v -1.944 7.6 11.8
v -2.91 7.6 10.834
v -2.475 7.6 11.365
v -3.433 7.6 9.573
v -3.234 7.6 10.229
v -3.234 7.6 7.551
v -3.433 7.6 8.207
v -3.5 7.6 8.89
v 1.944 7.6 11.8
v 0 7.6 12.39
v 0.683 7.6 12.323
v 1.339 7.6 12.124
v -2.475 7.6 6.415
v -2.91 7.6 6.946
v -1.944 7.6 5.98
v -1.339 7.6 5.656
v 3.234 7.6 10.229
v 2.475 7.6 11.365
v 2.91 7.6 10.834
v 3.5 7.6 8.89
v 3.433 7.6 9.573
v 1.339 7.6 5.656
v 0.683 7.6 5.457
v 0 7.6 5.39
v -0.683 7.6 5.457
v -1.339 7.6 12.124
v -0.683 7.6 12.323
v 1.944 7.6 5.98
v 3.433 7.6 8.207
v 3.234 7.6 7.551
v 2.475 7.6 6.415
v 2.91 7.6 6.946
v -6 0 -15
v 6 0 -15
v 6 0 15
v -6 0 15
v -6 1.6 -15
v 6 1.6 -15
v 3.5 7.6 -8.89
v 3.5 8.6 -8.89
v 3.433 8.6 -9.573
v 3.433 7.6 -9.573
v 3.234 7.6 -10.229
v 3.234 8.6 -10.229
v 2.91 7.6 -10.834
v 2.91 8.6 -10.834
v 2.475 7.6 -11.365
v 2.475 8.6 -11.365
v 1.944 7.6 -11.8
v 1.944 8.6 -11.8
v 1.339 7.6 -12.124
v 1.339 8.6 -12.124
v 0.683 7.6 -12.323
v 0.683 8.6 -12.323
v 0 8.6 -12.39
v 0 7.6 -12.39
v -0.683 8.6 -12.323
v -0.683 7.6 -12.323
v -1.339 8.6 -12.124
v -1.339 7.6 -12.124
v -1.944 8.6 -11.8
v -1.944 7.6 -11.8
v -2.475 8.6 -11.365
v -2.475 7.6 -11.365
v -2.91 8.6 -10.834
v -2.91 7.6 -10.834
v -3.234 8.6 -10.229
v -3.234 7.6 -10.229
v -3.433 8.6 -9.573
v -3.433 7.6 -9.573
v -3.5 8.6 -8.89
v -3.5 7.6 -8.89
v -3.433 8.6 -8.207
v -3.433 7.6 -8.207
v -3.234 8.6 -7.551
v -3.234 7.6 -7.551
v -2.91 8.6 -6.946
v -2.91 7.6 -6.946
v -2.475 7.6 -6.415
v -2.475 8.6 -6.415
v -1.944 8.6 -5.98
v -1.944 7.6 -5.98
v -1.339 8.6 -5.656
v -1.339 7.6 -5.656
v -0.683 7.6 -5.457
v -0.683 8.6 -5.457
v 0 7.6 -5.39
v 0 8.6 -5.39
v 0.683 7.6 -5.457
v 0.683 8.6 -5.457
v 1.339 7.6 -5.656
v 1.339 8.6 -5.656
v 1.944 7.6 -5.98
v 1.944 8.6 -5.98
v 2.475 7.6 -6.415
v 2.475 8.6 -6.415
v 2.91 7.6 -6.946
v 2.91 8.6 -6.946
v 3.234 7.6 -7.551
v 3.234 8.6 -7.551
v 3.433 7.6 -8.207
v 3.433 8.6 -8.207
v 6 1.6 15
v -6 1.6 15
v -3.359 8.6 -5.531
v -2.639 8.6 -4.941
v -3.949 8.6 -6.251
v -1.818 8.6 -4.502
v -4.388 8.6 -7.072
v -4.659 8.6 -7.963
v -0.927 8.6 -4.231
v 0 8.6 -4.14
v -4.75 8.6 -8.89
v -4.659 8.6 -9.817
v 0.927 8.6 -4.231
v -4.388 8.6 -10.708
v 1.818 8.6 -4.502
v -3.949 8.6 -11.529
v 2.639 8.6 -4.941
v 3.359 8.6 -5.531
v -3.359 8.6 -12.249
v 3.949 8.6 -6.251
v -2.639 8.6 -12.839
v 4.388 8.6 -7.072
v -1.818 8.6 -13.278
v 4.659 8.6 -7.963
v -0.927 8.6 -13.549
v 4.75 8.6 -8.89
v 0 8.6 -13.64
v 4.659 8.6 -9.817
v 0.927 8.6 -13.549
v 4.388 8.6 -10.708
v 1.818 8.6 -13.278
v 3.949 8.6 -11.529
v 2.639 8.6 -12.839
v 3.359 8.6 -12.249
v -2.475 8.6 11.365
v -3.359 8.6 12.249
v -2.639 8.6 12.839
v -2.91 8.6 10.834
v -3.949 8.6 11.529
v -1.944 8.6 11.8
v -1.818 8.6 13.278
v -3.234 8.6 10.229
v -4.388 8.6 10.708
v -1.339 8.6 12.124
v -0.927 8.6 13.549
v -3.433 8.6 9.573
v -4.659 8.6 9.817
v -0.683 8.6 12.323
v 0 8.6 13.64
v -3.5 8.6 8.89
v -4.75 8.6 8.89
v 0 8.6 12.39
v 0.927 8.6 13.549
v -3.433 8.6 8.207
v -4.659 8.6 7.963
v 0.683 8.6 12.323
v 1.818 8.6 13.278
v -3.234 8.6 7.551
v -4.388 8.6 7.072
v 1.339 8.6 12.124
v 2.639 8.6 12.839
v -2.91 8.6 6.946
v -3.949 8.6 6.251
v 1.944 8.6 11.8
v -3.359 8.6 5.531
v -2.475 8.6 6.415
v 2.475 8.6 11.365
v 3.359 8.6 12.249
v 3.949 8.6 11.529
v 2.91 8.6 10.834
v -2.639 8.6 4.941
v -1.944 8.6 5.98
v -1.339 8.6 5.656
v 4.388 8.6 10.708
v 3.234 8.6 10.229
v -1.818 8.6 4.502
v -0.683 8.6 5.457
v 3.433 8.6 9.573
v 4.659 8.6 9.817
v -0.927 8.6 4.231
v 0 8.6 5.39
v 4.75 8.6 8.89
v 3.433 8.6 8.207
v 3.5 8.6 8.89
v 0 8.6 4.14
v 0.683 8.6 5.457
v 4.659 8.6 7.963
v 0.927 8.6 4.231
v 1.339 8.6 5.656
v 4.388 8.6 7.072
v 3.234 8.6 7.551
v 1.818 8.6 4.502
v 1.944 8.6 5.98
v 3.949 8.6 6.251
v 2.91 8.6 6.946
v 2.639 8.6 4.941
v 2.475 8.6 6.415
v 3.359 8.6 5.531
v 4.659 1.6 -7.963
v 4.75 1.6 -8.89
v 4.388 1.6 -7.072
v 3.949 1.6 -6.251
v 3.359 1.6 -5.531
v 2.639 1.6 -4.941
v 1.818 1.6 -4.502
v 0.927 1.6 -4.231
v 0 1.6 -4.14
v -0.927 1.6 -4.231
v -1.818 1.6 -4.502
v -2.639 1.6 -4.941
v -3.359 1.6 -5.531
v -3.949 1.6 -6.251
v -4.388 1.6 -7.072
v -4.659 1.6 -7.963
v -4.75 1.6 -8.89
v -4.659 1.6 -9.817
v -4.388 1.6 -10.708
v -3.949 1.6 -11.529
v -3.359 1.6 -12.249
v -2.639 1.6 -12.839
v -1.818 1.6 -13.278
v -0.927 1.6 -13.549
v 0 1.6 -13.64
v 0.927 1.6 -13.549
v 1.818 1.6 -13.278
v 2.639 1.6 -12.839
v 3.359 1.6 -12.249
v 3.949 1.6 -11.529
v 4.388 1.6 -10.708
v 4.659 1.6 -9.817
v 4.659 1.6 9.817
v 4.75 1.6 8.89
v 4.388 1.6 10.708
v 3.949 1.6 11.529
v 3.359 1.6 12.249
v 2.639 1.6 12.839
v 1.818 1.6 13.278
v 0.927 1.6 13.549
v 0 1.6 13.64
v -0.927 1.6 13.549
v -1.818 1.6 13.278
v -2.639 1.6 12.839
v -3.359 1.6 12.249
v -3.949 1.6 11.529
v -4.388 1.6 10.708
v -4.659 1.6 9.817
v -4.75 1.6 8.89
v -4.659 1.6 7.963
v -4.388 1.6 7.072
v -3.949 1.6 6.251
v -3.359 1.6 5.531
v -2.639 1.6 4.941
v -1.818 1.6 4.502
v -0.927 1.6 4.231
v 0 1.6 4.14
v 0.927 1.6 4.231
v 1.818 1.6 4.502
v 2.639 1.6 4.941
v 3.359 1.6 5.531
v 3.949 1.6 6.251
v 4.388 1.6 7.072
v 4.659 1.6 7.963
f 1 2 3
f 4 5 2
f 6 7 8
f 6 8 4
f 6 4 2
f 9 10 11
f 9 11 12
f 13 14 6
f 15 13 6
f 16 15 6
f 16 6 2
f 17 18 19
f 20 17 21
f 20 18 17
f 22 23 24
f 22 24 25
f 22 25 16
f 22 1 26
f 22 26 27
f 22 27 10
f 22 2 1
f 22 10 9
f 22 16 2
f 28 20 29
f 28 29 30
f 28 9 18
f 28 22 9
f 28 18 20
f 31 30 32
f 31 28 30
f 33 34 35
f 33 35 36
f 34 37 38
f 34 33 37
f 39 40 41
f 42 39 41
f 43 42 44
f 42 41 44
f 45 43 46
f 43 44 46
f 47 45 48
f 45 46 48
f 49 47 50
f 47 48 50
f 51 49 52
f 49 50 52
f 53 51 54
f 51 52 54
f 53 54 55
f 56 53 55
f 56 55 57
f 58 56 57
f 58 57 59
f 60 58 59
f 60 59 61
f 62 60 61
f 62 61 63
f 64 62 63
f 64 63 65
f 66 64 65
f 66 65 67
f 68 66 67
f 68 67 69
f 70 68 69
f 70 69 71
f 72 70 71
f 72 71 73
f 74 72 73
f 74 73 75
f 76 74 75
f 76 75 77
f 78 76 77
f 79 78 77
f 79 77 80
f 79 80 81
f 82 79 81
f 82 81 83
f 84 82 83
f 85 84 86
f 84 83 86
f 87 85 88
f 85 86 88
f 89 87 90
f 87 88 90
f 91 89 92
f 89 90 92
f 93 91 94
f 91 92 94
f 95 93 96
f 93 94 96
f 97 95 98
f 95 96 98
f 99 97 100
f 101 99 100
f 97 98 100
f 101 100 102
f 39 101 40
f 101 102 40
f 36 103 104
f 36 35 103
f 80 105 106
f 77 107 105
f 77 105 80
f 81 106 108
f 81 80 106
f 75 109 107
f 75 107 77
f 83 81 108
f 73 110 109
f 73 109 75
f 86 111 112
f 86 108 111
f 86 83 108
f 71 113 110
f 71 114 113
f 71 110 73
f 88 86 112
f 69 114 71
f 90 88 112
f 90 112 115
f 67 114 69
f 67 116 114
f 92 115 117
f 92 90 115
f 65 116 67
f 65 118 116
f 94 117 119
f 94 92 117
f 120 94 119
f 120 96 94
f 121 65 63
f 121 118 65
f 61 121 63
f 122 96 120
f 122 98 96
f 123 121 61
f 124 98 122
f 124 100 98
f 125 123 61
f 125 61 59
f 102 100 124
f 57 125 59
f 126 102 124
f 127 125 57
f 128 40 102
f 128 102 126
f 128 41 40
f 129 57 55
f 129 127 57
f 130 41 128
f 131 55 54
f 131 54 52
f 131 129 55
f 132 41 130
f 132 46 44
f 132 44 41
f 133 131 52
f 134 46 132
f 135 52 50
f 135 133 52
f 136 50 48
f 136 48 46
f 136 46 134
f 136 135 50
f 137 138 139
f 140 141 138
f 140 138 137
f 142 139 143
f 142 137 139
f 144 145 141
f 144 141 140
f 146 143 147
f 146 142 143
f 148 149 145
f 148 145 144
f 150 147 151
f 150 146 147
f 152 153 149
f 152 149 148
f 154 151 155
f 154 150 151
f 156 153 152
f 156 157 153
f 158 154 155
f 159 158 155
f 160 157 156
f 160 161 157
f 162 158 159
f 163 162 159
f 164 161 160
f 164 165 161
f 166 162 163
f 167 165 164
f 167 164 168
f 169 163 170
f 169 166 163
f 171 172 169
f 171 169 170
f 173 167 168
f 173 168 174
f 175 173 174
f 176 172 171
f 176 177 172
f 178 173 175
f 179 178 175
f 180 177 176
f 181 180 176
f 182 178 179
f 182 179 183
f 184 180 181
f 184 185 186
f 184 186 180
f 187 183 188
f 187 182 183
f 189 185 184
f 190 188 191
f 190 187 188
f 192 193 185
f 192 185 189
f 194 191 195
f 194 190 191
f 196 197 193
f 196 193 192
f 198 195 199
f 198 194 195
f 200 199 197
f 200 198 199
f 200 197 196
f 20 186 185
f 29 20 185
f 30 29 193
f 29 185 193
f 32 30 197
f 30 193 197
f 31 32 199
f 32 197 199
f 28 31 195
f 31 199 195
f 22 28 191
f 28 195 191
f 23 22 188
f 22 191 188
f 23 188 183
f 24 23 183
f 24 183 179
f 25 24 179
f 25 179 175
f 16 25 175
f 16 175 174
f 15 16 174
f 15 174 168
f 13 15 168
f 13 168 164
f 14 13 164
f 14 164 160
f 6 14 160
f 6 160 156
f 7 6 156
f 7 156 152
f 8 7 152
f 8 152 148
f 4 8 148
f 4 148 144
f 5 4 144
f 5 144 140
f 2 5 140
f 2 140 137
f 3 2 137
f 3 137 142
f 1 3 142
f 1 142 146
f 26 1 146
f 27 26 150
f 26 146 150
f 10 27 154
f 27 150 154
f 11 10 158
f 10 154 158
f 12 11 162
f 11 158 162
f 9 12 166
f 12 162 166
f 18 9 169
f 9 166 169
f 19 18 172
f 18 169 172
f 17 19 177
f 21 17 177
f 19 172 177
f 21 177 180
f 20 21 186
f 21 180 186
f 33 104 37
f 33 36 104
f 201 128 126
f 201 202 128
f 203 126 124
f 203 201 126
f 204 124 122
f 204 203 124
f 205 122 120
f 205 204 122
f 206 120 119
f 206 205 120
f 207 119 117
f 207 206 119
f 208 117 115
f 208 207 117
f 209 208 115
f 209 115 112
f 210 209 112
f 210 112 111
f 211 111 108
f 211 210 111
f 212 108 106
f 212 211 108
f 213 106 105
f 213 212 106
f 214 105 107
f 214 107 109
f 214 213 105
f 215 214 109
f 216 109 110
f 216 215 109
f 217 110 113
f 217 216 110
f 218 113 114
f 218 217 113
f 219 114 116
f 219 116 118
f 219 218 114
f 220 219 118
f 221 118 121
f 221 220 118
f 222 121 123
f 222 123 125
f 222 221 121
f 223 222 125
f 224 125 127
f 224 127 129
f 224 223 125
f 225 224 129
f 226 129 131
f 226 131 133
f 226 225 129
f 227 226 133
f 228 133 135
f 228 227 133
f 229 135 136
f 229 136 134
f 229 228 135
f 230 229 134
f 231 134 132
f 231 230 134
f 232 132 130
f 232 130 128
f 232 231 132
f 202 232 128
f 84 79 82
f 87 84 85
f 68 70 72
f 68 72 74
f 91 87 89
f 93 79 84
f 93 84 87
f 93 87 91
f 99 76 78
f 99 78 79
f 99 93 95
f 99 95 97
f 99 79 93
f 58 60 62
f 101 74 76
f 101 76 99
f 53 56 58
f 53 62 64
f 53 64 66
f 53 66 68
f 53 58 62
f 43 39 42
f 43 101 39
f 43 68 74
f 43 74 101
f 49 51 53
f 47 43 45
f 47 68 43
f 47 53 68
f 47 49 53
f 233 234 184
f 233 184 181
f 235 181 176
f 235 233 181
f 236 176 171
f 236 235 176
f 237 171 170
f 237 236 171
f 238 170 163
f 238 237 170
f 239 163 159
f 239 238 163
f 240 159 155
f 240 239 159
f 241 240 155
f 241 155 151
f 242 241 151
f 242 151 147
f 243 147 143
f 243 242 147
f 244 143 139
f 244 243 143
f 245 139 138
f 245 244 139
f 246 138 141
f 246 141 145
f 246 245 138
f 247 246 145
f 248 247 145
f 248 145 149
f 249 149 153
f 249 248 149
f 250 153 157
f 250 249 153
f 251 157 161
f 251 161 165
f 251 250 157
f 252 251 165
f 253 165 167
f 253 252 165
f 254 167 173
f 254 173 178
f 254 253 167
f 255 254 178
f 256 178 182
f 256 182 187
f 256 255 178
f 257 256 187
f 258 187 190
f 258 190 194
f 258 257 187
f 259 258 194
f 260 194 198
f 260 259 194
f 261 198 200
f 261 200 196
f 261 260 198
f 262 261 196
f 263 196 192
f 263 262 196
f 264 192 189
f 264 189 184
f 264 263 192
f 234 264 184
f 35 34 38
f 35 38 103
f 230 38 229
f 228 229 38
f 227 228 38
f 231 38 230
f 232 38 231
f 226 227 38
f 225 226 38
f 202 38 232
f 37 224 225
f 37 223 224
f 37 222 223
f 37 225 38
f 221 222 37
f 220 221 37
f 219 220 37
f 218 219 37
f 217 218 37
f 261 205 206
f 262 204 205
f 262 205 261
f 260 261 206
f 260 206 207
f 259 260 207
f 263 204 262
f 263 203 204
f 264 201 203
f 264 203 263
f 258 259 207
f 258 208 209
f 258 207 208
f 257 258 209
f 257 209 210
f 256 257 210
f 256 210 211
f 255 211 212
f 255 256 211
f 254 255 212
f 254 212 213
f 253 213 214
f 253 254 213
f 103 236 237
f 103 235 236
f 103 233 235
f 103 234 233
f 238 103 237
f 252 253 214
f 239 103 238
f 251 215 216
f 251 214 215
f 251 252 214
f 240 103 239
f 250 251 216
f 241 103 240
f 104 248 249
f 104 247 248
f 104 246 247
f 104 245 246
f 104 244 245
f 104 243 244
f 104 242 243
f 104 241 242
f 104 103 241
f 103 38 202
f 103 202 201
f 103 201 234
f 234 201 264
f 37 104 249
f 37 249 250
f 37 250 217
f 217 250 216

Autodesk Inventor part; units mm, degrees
ref_plane "YZ Plane" through (0, 0, 0) normal (1, 0, 0) x (0, 1, 0)
ref_plane "XZ Plane" through (0, 0, 0) normal (0, 1, 0) x (-1, 0, 0)
ref_plane "XY Plane" through (0, 0, 0) normal (0, 0, 1) x (1, 0, 0)
sketch "Sketch1" plane through (0, 0, 0) normal (0, 1, 0) x (-1, 0, 0)
  line L0 (-6, -15) -> (-6, 15)
  line L1 (-6, 15) -> (6, 15)
  line L2 (6, 15) -> (6, -15)
  line L3 (6, -15) -> (-6, -15)
  line L4 (-6, -15) -> (6, 15) construction
  line L5 (-6, 15) -> (6, -15) construction
  line L6 (-6, -15) -> (24, -15) construction
  point P0 (0, 0)
  dimension "d0" = 30
  dimension "d1" = 90
  dimension "d2" = 12
extrude "Extrusion1" add sketch "Sketch1" along normal blind 1.6
sketch "Sketch2" plane through (0, 1.6, 0) normal (0, 1, 0) x (1, 0, 0)
  line L0 (0, 0) -> (0, -8.89)
  line L1 (0, 0) -> (8.89, 0) construction
  line L2 (0, -8.89) -> (0, 8.89)
  circle A0 centre (0, -8.89) radius 4.75
  circle A1 centre (0, 8.89) radius 4.75
  dimension "d5" = 8.89
  dimension "d6" = 90
  dimension "d7" = 17.78
  dimension "d8" = 0
  dimension "d9" = 9.5
  dimension "d10" = 9.5
extrude "Extrusion2" add sketch "Sketch2" along normal blind 7
sketch "Sketch3" plane through (0, 8.6, 8.89) normal (0, 1, 0) x (1, 0, 0)
  circle A0 centre (0, 0) radius 3.5
  line L0 (0, 8.89) -> (0, 17.78)
  circle A1 centre (0, 17.78) radius 3.5
  dimension "d13" = 7
  dimension "d14" = 8.89
  dimension "d15" = 7
extrude "Extrusion3" cut sketch "Sketch3" against normal blind 1
properties part number "Sonar"
